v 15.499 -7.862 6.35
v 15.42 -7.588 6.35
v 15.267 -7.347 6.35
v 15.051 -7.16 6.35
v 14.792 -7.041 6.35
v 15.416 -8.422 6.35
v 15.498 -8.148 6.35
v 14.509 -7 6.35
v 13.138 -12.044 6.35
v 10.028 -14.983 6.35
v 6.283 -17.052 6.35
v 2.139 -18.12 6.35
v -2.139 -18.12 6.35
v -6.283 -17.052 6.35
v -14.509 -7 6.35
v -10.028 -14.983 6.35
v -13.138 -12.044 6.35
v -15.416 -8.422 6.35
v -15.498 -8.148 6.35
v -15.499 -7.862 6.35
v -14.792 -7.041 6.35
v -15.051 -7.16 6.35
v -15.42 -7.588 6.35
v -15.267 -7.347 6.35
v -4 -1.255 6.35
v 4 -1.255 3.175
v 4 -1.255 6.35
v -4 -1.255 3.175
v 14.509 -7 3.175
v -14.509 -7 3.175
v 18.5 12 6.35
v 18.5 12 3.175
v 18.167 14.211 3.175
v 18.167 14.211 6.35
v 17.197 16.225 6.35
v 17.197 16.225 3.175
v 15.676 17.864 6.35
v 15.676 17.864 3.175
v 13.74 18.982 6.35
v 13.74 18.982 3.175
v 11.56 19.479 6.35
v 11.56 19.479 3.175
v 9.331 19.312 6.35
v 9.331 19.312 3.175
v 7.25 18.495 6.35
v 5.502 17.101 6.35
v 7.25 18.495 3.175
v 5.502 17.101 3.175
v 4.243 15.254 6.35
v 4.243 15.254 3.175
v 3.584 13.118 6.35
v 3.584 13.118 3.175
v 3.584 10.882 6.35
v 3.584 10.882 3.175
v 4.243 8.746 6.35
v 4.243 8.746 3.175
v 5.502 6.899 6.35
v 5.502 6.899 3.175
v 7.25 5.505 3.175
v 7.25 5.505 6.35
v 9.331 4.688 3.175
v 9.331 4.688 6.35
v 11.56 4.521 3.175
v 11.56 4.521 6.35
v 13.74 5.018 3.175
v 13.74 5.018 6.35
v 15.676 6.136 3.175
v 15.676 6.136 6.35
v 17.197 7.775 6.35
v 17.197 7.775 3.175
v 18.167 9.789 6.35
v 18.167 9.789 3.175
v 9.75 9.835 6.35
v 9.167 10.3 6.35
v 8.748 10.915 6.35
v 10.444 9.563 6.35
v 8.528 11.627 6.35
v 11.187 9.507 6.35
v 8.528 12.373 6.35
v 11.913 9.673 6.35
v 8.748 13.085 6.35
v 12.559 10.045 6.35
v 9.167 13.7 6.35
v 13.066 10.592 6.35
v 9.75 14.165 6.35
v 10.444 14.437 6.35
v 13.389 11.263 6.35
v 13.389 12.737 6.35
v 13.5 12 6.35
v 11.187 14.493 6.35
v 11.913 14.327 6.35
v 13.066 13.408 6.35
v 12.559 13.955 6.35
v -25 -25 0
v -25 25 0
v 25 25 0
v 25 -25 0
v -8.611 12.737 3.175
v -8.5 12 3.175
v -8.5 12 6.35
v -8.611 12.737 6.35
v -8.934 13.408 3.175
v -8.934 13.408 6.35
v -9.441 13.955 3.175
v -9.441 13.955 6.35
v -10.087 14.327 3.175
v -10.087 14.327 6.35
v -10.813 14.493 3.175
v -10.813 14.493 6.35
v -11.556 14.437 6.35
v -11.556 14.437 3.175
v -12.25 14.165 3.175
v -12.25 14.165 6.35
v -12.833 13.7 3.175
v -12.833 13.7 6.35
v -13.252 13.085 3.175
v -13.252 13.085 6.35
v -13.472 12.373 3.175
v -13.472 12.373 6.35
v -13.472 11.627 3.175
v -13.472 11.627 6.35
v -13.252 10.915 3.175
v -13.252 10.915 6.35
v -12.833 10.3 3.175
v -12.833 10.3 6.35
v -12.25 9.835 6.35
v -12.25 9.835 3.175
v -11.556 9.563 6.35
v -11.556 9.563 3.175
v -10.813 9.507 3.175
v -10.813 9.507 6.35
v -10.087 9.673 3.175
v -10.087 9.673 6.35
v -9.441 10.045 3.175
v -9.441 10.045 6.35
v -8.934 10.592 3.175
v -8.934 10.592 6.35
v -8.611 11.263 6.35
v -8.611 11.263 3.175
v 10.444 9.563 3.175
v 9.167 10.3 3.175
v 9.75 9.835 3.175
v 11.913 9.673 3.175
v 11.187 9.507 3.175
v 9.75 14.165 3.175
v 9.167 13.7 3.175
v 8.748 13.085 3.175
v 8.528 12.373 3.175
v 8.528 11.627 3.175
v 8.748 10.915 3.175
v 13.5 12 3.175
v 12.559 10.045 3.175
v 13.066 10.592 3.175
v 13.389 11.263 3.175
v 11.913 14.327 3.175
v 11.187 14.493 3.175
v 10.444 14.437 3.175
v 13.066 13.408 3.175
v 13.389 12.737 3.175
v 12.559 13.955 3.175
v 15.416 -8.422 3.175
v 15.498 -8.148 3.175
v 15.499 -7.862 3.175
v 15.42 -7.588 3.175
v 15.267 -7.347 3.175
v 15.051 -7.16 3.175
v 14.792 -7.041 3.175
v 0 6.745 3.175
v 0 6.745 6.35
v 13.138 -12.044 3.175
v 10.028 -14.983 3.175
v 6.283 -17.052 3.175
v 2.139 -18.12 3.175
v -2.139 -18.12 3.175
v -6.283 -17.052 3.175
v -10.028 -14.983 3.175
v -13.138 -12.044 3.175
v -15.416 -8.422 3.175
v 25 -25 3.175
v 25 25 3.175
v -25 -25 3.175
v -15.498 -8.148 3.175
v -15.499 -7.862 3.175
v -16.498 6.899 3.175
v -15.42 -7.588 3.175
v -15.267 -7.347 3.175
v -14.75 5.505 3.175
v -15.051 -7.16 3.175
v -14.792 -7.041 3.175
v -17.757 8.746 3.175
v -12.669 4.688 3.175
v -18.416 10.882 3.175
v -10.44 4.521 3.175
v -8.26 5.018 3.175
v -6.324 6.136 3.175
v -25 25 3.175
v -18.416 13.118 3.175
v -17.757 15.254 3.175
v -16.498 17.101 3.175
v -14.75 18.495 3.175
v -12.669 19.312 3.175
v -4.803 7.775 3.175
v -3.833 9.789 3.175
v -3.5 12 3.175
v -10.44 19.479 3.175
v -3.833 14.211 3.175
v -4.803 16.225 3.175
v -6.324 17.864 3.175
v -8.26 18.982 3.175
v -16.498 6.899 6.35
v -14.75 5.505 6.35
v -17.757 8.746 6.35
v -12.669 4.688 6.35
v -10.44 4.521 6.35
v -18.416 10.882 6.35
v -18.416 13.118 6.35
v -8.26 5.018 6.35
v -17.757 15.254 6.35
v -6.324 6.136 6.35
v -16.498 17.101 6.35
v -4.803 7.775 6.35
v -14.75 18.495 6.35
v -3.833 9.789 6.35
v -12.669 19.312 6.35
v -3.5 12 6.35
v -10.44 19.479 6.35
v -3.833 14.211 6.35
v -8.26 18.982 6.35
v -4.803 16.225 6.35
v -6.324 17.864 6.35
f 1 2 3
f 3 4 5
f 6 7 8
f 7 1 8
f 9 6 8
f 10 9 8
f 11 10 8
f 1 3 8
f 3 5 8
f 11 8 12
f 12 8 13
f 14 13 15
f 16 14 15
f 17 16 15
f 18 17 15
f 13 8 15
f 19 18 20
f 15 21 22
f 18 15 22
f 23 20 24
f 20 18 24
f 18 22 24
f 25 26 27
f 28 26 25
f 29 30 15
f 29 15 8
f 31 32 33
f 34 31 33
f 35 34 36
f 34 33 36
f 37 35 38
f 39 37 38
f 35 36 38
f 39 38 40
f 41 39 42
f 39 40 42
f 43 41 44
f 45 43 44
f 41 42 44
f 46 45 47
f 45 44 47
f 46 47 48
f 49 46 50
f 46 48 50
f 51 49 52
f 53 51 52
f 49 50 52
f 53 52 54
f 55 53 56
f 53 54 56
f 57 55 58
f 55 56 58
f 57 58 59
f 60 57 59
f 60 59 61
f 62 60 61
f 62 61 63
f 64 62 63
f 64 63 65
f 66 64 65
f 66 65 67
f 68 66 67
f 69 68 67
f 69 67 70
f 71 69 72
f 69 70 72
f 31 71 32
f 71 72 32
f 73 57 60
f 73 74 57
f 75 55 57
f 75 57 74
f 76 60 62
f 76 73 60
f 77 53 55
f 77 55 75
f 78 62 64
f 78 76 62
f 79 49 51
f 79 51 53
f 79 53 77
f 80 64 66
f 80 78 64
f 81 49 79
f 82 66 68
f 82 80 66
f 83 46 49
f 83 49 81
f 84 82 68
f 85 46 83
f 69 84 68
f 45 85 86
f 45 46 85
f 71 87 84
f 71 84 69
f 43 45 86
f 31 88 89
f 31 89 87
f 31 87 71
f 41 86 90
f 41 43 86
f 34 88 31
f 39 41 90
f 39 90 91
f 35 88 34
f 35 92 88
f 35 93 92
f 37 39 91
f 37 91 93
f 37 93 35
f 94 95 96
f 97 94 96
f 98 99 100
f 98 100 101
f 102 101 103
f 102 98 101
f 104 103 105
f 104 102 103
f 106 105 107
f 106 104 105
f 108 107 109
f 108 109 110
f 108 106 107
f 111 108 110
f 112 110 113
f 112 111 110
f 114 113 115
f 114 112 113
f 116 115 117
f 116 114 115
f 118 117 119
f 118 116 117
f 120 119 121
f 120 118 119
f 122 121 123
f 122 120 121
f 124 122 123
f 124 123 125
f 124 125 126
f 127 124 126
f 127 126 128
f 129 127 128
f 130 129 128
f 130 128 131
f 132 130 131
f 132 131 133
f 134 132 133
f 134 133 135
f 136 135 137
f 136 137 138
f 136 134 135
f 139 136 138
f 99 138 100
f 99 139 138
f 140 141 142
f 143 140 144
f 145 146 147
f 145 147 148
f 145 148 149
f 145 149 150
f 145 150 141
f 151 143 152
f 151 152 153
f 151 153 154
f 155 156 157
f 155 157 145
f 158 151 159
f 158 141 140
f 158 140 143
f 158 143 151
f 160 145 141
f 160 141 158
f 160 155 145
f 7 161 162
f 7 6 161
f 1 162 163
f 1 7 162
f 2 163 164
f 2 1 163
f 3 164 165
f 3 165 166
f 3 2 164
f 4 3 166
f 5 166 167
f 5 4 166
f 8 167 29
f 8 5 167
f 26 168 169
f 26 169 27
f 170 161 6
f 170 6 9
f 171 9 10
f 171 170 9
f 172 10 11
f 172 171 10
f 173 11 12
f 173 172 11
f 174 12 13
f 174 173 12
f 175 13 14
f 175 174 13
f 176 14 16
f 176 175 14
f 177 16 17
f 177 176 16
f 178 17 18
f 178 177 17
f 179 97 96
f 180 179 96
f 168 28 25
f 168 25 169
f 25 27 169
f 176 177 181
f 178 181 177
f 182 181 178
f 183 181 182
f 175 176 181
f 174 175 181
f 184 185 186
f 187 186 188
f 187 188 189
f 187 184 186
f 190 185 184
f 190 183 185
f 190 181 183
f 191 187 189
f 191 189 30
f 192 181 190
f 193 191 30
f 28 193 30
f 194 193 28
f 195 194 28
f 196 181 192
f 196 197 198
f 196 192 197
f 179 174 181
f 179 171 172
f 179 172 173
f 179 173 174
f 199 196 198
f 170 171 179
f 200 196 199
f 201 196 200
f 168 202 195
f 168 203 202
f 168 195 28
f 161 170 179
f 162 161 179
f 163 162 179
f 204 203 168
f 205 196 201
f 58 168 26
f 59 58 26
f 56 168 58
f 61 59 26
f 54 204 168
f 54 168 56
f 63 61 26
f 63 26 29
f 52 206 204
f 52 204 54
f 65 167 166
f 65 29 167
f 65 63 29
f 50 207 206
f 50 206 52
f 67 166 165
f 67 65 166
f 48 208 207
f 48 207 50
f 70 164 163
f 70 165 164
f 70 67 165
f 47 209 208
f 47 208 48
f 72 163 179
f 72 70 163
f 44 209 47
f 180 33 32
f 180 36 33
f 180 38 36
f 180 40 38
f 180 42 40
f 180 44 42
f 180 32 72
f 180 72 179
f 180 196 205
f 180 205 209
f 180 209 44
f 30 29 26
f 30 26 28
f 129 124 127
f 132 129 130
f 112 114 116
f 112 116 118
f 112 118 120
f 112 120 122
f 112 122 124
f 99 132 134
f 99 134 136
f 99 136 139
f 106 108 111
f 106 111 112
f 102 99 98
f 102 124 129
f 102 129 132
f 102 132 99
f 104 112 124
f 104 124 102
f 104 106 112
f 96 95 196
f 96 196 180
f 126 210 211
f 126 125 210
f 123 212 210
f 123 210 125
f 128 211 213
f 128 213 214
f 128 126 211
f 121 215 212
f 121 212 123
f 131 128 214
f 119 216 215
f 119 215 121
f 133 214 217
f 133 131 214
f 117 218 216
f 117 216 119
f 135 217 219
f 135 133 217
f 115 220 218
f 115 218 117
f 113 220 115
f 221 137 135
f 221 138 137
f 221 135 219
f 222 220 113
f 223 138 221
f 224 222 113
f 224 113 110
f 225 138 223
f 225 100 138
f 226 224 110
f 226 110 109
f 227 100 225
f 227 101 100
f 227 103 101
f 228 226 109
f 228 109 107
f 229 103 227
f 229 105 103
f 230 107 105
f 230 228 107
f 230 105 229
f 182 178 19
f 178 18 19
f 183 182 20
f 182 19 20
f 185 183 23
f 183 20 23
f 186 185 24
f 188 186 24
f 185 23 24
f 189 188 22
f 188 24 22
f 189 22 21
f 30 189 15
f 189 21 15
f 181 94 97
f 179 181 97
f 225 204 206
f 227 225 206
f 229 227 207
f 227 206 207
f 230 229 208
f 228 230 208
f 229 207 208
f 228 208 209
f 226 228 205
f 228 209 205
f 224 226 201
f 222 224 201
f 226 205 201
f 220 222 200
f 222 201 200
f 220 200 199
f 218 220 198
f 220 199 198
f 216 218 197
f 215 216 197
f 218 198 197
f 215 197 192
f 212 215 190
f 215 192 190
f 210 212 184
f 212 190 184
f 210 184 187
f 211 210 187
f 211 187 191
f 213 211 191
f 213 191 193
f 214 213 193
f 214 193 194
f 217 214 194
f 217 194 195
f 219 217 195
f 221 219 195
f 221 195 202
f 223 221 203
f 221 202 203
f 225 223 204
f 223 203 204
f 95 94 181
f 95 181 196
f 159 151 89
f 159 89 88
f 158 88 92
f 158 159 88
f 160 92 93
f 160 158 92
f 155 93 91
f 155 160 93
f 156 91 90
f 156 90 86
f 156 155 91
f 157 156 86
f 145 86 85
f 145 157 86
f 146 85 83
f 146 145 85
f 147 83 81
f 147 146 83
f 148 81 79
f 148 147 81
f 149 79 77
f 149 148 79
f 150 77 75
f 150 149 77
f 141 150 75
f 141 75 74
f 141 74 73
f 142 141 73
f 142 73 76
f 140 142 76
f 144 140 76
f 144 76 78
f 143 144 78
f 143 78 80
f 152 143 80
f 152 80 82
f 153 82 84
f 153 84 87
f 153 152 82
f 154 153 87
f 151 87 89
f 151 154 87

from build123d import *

# Parameters (mm, degrees)
SKETCH1_W           = 50
SKETCH1_H           = 50
BOSS_EXTRUDE1_DEPTH = 3.175
SKETCH2_R           = 7.5
SKETCH2_R_2         = 2.5
BOSS_EXTRUDE2_DEPTH = 3.175
FILLET1_R           = 1


with BuildPart() as part:
    # Sketch1 → Boss-Extrude1 (new body)
    with BuildSketch(Plane.XY):
        Rectangle(SKETCH1_W, SKETCH1_H)
    extrude(amount=BOSS_EXTRUDE1_DEPTH)

    # Sketch2 → Boss-Extrude2 (add)
    with BuildSketch(Plane.XY.offset(3.175)):
        with Locations((-11, 12)):
            Circle(SKETCH2_R)
        with Locations((-11, 12)):
            Circle(SKETCH2_R_2, mode=Mode.SUBTRACT)
        with Locations((11, 12)):
            Circle(SKETCH2_R)
        with Locations((11, 12)):
            Circle(SKETCH2_R_2, mode=Mode.SUBTRACT)
        with BuildLine():
            Line((-16, -7), (16, -7))
            ThreePointArc((16, -7), (0, -18.255437353), (-16, -7))
        make_face()
        Polygon((0, 6.744562647), (4, -1.255437353), (-4, -1.255437353), align=None)
    extrude(amount=BOSS_EXTRUDE2_DEPTH)

    # Fillet1
    fillet1_edges = [part.edges().sort_by_distance(p)[0] for p in [
        (-16, -7, 4.7625),
        (16, -7, 4.7625),
    ]]
    fillet(fillet1_edges, radius=FILLET1_R)


solid = part.part
